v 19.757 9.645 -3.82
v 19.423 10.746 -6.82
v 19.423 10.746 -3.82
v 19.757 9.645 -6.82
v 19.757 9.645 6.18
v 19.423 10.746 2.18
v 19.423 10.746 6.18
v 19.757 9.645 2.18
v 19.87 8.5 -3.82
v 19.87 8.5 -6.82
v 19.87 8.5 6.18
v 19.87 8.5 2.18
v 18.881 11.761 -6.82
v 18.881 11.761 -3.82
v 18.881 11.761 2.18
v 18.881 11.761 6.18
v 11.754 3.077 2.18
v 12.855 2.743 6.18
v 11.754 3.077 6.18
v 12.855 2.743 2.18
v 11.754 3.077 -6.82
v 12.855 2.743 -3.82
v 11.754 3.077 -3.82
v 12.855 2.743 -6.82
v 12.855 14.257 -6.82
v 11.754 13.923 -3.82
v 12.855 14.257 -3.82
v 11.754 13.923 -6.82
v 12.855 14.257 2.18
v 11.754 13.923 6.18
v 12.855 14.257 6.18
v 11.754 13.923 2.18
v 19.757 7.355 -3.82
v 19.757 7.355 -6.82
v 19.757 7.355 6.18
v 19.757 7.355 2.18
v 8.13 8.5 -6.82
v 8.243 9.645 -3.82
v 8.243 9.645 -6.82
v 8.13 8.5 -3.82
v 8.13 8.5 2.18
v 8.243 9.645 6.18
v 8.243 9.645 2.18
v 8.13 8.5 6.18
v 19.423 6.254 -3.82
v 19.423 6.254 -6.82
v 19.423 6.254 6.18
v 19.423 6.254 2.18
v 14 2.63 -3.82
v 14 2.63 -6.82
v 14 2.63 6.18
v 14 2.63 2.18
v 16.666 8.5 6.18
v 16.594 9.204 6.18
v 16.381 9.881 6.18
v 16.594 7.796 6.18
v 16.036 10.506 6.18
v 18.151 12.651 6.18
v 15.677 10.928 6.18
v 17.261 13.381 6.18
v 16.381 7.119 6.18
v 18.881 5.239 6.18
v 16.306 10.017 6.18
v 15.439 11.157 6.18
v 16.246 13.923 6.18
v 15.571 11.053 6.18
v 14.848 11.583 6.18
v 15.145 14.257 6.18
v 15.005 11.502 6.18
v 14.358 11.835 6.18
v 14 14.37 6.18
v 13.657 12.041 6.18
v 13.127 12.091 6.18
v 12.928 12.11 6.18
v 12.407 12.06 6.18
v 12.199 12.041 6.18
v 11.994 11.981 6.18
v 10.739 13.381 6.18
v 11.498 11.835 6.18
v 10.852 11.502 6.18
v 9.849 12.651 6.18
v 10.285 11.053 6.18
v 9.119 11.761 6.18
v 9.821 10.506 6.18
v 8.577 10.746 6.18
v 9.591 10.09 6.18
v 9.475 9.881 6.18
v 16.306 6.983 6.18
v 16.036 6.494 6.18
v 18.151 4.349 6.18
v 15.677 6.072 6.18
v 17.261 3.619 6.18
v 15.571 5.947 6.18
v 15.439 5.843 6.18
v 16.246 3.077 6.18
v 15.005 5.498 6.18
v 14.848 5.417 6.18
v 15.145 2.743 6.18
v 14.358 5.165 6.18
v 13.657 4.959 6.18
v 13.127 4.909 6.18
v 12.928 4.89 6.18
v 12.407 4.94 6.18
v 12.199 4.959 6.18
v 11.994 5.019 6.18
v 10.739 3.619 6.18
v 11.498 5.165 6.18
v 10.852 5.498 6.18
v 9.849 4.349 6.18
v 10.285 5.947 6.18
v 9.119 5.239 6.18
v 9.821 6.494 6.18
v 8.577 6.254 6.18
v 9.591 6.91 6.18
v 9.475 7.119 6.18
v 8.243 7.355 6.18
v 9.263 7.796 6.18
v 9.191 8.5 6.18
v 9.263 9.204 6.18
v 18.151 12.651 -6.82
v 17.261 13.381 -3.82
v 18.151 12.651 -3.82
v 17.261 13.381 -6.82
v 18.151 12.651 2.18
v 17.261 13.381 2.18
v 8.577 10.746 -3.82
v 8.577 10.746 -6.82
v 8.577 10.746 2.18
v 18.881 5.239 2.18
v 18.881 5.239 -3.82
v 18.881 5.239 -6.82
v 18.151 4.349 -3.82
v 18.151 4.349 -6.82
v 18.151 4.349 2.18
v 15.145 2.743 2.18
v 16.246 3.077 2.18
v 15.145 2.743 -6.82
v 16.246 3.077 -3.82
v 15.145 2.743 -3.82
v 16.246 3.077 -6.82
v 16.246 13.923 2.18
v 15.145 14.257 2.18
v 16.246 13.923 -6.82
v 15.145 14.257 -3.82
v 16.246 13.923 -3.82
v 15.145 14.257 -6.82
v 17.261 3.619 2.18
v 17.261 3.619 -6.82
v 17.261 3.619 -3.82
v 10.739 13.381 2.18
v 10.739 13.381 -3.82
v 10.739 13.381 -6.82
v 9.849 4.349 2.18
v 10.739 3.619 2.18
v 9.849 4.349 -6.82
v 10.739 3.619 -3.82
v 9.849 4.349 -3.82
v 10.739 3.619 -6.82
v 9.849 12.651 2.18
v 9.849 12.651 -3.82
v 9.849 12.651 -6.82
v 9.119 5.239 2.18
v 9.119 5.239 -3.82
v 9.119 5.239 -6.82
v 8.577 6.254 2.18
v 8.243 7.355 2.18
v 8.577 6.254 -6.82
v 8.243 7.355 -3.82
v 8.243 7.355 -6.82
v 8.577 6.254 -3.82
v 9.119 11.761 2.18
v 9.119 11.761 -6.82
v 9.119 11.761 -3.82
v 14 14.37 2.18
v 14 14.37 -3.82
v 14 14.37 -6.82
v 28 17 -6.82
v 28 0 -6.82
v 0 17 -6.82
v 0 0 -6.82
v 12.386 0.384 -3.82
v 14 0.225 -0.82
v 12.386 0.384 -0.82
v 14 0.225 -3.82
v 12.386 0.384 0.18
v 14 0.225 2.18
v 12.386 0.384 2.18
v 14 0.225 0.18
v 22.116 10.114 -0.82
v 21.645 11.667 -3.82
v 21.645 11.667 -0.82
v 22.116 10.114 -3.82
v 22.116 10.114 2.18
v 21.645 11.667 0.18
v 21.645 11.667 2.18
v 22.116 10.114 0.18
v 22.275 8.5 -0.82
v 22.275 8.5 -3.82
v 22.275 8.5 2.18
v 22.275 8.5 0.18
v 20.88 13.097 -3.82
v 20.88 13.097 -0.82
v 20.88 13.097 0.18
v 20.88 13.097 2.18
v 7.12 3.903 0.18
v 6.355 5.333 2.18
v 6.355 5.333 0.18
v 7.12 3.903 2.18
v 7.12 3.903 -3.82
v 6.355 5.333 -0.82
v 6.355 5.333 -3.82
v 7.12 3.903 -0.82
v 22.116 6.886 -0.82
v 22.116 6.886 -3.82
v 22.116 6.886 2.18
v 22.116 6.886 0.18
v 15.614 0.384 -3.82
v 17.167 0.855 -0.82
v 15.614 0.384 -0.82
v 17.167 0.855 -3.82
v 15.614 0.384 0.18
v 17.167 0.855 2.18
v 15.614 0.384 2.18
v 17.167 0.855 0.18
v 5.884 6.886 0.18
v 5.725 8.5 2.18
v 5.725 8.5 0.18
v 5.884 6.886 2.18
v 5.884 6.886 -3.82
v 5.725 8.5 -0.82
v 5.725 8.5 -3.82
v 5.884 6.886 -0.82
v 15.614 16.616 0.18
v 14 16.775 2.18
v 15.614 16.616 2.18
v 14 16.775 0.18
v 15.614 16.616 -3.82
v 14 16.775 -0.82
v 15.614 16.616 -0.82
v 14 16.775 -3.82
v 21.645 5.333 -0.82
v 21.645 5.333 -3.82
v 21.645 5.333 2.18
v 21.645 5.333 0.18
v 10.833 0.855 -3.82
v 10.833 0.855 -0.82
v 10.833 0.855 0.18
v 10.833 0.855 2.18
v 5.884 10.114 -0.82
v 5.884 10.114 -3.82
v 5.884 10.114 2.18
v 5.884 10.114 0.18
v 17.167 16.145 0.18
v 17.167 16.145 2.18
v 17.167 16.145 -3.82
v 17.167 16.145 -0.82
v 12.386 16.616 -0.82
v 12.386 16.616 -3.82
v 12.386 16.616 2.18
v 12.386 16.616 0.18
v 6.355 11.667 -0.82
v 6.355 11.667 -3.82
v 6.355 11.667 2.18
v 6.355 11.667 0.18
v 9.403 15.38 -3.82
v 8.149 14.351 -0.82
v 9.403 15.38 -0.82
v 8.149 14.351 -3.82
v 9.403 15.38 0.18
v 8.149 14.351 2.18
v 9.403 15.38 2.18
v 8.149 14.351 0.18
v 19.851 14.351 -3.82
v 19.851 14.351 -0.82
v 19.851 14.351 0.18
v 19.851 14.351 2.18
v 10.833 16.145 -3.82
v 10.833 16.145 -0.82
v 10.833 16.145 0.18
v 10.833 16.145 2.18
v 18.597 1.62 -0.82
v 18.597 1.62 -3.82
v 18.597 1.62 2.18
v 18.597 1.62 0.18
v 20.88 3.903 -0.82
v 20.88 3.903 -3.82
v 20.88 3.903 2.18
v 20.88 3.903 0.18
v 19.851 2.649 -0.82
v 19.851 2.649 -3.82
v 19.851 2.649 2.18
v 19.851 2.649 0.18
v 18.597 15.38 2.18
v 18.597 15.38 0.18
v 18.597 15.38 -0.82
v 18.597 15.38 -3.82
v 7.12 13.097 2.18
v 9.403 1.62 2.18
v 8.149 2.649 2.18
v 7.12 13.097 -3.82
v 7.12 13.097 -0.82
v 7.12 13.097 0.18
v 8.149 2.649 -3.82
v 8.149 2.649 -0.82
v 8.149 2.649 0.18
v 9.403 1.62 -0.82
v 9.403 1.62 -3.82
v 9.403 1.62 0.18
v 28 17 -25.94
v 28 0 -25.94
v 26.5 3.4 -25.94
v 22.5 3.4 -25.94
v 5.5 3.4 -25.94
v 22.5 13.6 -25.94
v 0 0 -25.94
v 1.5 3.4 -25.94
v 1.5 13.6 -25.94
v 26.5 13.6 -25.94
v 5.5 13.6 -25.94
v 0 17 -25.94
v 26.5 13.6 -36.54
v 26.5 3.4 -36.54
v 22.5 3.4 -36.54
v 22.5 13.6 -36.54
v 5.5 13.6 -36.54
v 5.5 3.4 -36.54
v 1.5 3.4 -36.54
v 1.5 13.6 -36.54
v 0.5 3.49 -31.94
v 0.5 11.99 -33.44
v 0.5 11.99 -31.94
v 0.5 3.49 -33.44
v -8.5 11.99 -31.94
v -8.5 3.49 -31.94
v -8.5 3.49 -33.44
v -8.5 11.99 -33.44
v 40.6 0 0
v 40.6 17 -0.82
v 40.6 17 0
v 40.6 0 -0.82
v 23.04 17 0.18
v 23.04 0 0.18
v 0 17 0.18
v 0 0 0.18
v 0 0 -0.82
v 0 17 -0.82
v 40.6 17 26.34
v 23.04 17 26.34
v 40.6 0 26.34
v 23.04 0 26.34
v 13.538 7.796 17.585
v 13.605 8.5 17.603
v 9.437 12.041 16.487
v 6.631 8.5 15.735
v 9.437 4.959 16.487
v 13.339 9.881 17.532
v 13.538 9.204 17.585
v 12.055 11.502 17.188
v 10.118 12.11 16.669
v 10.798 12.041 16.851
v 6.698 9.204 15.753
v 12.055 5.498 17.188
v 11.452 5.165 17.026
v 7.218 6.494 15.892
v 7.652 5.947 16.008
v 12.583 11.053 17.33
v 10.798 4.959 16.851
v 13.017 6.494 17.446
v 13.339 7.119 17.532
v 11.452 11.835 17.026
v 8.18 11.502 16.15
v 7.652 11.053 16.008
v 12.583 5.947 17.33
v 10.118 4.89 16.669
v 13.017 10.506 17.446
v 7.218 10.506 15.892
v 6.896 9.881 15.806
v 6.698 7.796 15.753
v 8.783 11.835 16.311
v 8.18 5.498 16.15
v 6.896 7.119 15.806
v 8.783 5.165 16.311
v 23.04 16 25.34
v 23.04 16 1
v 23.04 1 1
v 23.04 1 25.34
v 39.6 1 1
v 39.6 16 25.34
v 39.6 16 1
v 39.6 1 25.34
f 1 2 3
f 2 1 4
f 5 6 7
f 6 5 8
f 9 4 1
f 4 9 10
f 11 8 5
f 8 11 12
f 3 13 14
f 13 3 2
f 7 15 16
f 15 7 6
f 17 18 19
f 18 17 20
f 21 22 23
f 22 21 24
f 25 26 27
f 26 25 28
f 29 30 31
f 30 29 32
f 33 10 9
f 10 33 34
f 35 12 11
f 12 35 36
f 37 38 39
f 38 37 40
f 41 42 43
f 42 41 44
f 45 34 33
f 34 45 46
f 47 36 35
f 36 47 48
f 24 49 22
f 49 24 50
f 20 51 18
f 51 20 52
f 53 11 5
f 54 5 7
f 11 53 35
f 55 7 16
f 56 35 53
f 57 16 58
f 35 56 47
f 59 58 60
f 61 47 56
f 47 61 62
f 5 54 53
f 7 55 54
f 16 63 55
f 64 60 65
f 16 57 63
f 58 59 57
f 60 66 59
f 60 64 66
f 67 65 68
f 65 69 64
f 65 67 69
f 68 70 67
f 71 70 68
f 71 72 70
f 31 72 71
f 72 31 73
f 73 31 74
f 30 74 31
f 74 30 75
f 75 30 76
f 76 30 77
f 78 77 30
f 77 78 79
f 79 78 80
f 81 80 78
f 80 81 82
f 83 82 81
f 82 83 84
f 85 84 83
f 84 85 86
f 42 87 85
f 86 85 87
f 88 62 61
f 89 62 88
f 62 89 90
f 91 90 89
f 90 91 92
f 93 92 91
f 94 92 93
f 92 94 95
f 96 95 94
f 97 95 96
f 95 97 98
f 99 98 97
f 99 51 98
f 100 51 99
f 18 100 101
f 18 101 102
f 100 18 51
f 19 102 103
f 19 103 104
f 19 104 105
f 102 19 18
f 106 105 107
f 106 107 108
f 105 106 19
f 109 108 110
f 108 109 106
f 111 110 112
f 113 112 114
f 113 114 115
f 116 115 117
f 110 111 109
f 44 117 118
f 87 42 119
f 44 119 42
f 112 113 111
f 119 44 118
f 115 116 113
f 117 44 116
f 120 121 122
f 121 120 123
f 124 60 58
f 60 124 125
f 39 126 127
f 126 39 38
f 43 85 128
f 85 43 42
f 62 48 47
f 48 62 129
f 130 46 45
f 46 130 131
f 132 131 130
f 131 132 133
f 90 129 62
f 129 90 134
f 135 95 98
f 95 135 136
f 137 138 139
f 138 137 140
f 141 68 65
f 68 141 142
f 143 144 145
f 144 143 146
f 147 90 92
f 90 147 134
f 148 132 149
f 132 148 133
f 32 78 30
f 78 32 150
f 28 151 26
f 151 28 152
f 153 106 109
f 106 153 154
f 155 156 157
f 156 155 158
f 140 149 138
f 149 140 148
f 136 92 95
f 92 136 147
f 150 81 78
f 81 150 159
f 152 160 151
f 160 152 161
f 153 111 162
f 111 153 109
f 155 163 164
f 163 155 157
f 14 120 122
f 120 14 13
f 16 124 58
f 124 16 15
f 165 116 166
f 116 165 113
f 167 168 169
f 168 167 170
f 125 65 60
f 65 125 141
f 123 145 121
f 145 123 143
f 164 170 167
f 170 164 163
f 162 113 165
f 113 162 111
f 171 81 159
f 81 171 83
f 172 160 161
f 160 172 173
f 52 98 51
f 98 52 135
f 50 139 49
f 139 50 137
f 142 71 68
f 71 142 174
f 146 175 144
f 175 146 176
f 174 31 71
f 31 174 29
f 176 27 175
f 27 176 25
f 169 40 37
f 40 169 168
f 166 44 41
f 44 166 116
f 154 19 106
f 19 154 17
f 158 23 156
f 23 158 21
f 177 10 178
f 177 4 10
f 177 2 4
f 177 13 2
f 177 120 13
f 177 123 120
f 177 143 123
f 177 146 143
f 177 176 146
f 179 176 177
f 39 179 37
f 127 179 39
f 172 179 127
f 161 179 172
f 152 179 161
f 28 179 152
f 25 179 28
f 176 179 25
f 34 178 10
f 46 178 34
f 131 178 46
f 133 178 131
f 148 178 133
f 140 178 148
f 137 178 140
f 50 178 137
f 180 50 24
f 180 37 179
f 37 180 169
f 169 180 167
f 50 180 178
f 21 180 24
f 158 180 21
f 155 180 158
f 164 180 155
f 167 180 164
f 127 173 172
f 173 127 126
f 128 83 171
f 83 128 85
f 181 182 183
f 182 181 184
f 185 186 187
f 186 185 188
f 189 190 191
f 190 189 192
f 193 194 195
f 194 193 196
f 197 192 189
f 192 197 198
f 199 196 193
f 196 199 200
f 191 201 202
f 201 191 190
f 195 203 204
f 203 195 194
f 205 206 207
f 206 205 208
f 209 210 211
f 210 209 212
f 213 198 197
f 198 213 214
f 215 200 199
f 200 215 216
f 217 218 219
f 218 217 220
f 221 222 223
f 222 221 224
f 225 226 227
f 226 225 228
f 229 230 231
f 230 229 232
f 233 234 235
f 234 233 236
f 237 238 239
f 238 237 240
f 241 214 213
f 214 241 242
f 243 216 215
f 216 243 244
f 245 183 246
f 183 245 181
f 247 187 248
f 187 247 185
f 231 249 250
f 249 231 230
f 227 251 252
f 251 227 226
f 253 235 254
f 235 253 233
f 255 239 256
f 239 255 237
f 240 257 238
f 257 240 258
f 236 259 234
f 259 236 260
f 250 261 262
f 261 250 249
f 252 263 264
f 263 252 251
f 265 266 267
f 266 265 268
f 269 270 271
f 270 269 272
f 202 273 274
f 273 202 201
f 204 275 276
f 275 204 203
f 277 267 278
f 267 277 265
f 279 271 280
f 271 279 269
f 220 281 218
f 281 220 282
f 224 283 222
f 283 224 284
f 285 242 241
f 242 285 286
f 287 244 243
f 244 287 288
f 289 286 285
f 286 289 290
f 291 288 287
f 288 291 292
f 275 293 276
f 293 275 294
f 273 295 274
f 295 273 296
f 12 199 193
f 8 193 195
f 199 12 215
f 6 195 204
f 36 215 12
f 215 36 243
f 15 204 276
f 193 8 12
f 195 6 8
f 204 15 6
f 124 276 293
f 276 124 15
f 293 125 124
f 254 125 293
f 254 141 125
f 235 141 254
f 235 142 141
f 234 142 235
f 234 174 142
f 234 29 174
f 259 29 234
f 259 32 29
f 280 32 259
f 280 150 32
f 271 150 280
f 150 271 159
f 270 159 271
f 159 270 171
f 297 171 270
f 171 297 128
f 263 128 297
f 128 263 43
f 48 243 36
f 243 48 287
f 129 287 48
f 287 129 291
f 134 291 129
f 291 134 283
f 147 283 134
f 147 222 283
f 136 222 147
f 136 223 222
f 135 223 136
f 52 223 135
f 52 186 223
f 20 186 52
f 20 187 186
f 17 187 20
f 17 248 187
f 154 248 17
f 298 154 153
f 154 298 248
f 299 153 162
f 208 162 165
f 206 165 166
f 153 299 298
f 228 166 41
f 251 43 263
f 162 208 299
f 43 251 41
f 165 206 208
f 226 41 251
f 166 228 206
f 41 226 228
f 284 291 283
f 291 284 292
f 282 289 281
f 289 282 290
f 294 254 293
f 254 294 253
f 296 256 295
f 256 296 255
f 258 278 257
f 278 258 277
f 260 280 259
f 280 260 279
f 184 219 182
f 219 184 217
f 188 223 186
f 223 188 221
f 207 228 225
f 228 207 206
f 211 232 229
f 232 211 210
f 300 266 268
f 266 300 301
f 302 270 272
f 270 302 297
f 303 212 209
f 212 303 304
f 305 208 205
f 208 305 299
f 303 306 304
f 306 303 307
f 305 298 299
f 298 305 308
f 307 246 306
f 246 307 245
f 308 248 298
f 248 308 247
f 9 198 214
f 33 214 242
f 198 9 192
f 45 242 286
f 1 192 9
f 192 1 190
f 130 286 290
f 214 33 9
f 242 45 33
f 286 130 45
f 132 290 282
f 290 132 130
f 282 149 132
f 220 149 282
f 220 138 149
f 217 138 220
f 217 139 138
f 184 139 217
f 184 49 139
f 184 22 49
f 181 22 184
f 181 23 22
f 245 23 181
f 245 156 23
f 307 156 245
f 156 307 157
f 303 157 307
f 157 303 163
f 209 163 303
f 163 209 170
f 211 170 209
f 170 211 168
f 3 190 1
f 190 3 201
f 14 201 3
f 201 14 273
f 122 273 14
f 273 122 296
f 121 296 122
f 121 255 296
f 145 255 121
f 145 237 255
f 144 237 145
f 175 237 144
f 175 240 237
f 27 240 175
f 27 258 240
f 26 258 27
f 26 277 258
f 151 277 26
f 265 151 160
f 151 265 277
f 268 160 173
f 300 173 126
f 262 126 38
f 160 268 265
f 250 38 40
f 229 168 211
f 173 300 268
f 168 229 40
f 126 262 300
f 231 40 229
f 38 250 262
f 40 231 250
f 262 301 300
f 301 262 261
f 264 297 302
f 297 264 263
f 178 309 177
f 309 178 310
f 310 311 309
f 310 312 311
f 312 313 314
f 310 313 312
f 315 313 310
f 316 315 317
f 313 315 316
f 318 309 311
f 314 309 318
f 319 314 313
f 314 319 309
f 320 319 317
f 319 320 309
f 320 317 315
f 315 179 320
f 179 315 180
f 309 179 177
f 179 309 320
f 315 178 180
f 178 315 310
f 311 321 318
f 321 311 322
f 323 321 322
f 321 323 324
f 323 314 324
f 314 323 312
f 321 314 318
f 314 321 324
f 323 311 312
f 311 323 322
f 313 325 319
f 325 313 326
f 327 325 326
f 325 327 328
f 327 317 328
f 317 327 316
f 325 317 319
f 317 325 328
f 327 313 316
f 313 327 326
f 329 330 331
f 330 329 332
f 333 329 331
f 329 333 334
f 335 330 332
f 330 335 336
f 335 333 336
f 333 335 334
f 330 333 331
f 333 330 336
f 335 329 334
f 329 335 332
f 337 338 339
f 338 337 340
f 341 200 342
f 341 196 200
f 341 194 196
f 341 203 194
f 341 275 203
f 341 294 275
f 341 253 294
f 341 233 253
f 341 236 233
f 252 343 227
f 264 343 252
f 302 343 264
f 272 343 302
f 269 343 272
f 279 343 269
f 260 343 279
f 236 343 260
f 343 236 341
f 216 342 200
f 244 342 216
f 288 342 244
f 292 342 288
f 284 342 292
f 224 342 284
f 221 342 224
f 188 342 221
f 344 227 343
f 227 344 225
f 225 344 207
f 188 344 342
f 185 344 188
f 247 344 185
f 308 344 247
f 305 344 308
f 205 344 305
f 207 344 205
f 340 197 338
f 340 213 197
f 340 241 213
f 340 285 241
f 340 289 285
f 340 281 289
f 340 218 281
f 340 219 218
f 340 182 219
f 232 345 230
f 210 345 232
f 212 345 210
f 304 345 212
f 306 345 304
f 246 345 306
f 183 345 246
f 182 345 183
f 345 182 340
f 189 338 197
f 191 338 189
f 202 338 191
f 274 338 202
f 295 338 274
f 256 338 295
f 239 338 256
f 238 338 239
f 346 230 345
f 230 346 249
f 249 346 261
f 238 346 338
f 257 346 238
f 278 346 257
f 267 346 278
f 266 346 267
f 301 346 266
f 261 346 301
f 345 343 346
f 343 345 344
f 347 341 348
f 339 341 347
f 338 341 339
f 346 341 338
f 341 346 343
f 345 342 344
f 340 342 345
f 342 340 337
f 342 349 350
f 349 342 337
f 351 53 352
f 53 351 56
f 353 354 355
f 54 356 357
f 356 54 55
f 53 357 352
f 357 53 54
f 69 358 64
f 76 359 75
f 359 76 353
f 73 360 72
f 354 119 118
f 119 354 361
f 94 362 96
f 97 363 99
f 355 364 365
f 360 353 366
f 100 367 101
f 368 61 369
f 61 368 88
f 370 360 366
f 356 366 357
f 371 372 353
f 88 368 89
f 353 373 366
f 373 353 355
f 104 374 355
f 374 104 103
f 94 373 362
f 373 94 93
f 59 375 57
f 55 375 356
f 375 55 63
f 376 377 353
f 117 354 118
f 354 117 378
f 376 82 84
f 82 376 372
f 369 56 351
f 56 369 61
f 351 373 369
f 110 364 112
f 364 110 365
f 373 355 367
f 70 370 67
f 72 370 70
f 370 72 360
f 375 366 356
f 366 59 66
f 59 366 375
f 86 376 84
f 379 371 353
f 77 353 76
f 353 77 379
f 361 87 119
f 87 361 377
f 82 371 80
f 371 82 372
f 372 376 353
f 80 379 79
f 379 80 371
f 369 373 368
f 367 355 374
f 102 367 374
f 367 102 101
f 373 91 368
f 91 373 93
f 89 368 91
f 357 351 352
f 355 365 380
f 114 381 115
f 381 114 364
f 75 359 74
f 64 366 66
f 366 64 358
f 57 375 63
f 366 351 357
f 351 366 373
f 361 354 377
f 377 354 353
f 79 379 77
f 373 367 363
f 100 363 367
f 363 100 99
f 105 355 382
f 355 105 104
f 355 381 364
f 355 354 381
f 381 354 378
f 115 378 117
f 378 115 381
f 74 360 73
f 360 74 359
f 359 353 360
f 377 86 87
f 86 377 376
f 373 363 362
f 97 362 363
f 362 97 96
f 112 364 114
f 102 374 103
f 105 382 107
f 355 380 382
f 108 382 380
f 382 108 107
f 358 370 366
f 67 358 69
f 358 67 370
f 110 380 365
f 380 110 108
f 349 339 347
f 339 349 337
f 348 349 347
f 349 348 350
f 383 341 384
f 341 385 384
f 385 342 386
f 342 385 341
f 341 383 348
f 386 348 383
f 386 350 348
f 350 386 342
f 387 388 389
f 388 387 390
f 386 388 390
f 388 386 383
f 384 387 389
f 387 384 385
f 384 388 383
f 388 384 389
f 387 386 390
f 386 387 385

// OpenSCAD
// A toggle switch ordered from https://www.sparkfun.com/products/11310

$fn = 32;

length = 28;
width = 17;
height = 19.12;

plate_thickness = 1;
cover_z = 6.82;
fudge = .01;

toggle_switch();
toggle_cover();

module toggle_switch() {
    translate([0, 0, -height - cover_z]) 
        union() {
            base();
            color("silver") prong1();
            color("silver") prong2();
            color("silver") prong3();
            color("black") shaft();
            color("silver") plate();
            color("red") toggle();
         }
}

module toggle_cover() {
    skin=1;
    color("red") translate([40.6 - 17.56, 0, 0])
    difference() {
        cube([17.56, width, 43.9 - 17.56]);
        translate([0,skin,skin]) cube([17.56-skin, width-2*skin, 43.9 - 17.56-2*skin]);
    }
}

module base() {
    cube([length, width, height]);
}

module prong1() {
    translate([length-1.5-4, width/5, -10.6]) cube([4, 3*width/5, 10.6]);
}

module prong2() {
    translate([1.5, width/5, -10.6]) cube([4, 3*width/5, 10.6]);
}

module prong3() {
    corner = 7;
    translate([-12 + corner/2, corner/2 - fudge, -11 + corner/2])
        cube([16 - corner, width/2, 1.5]);
}

module shaft() {
    translate([length/2, width/2, height]) cylinder(h = 13, r = 11.74 / 2);
    translate([length/2, width/2, height + 3]) cylinder(h = 6, r = 16.55 / 2);
}

module plate() {
    translate([0, 0, height + 6]) cube([40.6, 17, plate_thickness]);
}

module toggle() {
    translate([length/2, width/2, height + 9]) rotate([0, -15, 0]) {
        cylinder(h = 15, r = 7.22/2);    
    }
}

module cover() {
    color("red") translate([0, 0, height + cover_z])
        cube([40.6, width, 43.9 - 17.56]);
}
